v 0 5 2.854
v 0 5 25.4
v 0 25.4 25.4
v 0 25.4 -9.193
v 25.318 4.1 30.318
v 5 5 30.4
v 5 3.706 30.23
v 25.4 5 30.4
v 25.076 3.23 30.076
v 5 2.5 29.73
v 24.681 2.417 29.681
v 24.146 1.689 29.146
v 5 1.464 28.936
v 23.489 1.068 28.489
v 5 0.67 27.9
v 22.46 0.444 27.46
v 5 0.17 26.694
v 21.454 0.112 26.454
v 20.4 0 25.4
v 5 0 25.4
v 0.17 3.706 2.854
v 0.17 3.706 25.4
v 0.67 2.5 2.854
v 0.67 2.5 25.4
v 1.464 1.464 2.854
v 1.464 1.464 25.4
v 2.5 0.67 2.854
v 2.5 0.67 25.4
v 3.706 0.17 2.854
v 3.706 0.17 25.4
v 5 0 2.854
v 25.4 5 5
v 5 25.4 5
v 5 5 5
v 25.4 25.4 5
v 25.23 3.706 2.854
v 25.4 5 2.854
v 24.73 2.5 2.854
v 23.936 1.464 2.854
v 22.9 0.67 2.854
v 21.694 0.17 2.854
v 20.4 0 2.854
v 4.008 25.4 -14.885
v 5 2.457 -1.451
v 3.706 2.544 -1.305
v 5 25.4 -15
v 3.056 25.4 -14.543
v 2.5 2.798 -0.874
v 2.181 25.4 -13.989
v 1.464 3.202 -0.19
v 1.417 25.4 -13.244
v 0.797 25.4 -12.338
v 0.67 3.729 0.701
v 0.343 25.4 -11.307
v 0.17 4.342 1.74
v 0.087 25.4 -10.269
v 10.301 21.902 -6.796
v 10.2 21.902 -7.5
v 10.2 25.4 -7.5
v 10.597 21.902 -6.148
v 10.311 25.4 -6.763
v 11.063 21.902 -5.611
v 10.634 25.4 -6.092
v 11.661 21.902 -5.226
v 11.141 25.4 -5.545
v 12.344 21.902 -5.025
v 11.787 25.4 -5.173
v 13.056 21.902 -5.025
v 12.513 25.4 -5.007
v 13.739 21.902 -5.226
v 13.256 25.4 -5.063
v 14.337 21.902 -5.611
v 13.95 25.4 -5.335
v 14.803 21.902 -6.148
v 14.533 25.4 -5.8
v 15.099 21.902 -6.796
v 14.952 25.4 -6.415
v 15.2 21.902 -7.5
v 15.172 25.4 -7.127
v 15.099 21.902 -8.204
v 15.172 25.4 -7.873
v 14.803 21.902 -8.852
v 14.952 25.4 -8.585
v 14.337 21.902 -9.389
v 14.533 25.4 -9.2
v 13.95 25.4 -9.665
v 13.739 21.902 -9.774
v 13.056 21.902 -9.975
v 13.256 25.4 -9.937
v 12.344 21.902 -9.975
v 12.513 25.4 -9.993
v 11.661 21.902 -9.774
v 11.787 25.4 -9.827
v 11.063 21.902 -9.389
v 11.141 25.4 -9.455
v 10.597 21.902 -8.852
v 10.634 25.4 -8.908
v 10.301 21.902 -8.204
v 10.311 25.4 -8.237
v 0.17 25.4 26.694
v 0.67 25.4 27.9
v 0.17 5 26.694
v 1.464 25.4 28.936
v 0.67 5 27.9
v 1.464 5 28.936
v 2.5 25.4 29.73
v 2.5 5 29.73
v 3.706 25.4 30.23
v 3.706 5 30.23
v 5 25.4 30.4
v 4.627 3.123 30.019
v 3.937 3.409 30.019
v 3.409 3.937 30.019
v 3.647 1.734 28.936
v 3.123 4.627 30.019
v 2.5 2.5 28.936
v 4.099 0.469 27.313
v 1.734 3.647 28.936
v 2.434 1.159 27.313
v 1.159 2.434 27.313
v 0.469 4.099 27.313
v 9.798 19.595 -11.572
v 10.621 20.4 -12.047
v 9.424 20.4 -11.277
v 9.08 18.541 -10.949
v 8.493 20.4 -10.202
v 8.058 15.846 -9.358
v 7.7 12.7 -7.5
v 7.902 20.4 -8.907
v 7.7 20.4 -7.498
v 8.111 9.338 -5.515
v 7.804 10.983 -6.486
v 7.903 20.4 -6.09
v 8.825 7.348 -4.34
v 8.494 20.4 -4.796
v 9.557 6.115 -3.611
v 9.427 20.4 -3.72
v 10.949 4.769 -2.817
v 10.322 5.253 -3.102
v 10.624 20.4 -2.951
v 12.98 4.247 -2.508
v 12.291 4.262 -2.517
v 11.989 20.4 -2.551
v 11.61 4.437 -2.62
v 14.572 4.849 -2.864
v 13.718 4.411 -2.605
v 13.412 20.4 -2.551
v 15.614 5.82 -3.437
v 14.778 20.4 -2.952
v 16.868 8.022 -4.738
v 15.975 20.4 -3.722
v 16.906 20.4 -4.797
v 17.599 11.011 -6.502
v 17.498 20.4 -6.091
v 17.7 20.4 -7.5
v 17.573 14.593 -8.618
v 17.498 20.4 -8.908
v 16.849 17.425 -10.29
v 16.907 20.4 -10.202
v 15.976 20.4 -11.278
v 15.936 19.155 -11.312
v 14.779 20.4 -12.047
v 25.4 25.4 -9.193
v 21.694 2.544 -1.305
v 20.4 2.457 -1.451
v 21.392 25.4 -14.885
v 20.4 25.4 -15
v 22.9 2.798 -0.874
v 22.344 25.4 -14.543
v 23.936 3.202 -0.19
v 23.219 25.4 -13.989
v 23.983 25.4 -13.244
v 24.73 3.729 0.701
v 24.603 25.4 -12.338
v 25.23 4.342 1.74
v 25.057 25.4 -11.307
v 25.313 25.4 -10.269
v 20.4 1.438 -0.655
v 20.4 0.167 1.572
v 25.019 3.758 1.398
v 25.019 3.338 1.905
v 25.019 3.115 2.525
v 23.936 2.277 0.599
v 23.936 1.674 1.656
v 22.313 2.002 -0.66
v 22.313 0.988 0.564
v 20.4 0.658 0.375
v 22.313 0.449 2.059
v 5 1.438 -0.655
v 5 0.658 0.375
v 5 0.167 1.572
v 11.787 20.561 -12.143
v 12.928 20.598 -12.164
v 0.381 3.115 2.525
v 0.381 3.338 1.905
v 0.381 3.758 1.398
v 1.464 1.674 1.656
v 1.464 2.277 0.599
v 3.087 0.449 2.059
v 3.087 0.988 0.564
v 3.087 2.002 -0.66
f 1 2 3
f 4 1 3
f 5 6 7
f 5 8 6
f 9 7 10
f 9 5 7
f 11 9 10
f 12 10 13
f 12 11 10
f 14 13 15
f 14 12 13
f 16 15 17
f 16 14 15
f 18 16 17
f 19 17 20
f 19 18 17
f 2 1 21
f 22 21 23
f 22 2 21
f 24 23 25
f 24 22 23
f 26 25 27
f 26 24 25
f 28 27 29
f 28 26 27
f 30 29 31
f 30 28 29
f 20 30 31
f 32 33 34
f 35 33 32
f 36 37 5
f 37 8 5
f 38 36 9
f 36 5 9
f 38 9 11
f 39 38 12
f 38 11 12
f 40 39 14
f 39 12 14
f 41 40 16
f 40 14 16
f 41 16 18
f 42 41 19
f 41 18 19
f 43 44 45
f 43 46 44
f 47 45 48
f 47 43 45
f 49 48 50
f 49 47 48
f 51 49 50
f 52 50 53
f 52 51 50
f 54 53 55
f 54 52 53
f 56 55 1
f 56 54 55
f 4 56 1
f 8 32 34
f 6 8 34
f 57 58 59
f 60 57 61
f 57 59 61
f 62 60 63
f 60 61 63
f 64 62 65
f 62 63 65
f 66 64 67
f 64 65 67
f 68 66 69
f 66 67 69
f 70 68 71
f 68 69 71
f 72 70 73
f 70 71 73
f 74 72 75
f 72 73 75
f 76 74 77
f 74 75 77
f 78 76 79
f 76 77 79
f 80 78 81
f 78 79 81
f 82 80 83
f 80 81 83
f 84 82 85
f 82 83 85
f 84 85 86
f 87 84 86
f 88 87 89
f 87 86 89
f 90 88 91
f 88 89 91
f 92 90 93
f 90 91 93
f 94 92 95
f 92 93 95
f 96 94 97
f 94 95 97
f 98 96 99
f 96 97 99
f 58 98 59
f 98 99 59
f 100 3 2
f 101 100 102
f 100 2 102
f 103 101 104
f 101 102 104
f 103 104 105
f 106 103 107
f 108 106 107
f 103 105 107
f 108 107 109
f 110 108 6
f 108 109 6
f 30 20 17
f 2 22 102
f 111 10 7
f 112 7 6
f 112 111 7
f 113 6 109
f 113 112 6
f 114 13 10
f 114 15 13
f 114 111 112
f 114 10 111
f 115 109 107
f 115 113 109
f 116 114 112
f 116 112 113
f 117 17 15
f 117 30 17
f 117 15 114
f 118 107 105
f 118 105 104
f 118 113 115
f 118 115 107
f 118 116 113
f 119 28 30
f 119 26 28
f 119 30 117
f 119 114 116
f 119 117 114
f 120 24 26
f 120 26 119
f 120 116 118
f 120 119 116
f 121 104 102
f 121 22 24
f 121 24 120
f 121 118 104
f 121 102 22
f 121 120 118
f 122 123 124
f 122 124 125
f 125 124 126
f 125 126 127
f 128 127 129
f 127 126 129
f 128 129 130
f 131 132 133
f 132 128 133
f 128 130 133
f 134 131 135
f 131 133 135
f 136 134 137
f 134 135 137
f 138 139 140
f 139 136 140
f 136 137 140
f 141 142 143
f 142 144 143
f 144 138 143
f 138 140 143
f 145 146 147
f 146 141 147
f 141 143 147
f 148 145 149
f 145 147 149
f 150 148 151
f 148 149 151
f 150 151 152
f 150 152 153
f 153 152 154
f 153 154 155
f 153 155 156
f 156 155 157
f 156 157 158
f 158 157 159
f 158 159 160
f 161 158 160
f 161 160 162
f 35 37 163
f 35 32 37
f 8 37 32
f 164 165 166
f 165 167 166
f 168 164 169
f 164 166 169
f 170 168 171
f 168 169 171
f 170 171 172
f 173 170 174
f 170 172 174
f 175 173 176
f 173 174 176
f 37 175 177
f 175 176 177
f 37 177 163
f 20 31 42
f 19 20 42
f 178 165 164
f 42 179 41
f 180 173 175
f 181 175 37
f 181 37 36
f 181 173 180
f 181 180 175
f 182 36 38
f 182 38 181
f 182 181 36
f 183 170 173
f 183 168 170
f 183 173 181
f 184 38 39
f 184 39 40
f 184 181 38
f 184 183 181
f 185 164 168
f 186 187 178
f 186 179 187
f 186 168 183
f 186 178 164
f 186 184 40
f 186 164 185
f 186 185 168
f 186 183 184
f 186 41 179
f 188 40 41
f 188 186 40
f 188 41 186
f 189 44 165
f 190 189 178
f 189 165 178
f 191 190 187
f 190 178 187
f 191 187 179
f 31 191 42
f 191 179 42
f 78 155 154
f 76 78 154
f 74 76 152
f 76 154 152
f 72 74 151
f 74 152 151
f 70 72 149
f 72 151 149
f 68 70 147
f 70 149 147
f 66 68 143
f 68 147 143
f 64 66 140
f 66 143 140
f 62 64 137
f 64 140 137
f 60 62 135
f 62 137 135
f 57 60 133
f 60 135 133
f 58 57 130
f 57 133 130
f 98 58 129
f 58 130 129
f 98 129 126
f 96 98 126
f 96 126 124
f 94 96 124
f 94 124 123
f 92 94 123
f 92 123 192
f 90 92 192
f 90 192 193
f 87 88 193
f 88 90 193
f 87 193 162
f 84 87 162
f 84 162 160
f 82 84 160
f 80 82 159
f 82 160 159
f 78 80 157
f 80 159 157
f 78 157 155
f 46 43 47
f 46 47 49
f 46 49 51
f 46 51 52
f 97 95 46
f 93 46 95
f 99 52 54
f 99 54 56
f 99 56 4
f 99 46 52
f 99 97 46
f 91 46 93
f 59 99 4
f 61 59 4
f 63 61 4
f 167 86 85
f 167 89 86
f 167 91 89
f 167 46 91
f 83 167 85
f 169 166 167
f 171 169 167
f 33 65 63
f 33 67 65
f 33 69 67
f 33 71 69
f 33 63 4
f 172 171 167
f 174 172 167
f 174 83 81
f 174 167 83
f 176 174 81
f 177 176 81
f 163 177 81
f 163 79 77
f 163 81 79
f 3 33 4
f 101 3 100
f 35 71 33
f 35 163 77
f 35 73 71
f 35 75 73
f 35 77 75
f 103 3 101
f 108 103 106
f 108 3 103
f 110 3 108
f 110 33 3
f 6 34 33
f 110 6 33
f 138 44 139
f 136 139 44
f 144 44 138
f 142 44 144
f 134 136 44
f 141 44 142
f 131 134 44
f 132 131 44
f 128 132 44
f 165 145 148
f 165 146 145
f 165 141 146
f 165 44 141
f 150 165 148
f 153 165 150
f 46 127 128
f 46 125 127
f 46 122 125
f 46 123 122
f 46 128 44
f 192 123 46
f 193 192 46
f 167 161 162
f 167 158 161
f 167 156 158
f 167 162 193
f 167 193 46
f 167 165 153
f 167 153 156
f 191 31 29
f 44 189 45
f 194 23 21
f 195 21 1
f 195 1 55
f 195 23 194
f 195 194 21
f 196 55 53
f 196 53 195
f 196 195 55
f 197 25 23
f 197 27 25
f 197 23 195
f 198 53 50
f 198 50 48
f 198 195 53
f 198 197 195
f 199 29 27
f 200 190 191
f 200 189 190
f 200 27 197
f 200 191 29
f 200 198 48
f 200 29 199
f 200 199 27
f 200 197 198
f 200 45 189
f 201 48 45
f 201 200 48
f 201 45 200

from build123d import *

# Parameters (mm, degrees)
F0_W     = 25.4
F0_H     = 25.4
F1_DEPTH = 5
F3_DEPTH = 25.4
F5_DEPTH = 25.4
F7_D     = 5
F9_D     = 10
F9_DEPTH = 20.4
F9_TIP   = 3.0043030951
F10_R    = 4.99999


# Not quite as in the source:
# - a fillet or chamfer is up to 0.001 mm smaller than in the source, because OpenCascade refuses the exact size


with BuildPart() as f1:
    # F0 (on Top) → F1 (new body)
    with BuildSketch(Plane.XY):
        with Locations((12.7, 12.7)):
            Rectangle(F0_W, F0_H)
    extrude(amount=F1_DEPTH)

    # F2 (on face) → F3 (join)
    with BuildSketch(Plane.XY.offset(5)):
        Polygon((5, 25.4), (0, 25.4), (0, 0), (25.4, 0), (25.4, 5), (5, 5), align=None)
    extrude(amount=F3_DEPTH)

    # F4 (on face) → F5 (join, through all)
    with BuildSketch(Plane.YZ.offset(25.4)):
        Polygon((25.4, -15), (25.4, 0), (0, 0), align=None)
    extrude(amount=-F5_DEPTH)

    # F7 (through all)
    with Locations(Plane.XZ):
        with Locations((12.7, -7.5)):
            Hole(F7_D / 2)

    # F9
    with Locations(Plane.XZ):
        with Locations((12.7, -7.5)):
            Hole(F9_D / 2, depth=F9_DEPTH)
            with Locations((0, 0, -(F9_DEPTH + F9_TIP / 2))):  # 118° drill point
                Cone(0, F9_D / 2, F9_TIP, mode=Mode.SUBTRACT)

    # F10 (radius 5 in the source; OpenCascade refuses exactly that, so slightly less here)
    f10_edges = [f1.edges().sort_by_distance(p)[0] for p in [
        (0, 0, 15.2),
        (0, 12.7, -7.5),
        (12.7, 0, 0),
        (25.4, 12.7, -7.5),
        (25.4, 0, 15.2),
        (12.7, 0, 30.4),
        (0, 12.7, 30.4),
    ]]
    fillet(f10_edges, radius=F10_R)


solid = f1.part
